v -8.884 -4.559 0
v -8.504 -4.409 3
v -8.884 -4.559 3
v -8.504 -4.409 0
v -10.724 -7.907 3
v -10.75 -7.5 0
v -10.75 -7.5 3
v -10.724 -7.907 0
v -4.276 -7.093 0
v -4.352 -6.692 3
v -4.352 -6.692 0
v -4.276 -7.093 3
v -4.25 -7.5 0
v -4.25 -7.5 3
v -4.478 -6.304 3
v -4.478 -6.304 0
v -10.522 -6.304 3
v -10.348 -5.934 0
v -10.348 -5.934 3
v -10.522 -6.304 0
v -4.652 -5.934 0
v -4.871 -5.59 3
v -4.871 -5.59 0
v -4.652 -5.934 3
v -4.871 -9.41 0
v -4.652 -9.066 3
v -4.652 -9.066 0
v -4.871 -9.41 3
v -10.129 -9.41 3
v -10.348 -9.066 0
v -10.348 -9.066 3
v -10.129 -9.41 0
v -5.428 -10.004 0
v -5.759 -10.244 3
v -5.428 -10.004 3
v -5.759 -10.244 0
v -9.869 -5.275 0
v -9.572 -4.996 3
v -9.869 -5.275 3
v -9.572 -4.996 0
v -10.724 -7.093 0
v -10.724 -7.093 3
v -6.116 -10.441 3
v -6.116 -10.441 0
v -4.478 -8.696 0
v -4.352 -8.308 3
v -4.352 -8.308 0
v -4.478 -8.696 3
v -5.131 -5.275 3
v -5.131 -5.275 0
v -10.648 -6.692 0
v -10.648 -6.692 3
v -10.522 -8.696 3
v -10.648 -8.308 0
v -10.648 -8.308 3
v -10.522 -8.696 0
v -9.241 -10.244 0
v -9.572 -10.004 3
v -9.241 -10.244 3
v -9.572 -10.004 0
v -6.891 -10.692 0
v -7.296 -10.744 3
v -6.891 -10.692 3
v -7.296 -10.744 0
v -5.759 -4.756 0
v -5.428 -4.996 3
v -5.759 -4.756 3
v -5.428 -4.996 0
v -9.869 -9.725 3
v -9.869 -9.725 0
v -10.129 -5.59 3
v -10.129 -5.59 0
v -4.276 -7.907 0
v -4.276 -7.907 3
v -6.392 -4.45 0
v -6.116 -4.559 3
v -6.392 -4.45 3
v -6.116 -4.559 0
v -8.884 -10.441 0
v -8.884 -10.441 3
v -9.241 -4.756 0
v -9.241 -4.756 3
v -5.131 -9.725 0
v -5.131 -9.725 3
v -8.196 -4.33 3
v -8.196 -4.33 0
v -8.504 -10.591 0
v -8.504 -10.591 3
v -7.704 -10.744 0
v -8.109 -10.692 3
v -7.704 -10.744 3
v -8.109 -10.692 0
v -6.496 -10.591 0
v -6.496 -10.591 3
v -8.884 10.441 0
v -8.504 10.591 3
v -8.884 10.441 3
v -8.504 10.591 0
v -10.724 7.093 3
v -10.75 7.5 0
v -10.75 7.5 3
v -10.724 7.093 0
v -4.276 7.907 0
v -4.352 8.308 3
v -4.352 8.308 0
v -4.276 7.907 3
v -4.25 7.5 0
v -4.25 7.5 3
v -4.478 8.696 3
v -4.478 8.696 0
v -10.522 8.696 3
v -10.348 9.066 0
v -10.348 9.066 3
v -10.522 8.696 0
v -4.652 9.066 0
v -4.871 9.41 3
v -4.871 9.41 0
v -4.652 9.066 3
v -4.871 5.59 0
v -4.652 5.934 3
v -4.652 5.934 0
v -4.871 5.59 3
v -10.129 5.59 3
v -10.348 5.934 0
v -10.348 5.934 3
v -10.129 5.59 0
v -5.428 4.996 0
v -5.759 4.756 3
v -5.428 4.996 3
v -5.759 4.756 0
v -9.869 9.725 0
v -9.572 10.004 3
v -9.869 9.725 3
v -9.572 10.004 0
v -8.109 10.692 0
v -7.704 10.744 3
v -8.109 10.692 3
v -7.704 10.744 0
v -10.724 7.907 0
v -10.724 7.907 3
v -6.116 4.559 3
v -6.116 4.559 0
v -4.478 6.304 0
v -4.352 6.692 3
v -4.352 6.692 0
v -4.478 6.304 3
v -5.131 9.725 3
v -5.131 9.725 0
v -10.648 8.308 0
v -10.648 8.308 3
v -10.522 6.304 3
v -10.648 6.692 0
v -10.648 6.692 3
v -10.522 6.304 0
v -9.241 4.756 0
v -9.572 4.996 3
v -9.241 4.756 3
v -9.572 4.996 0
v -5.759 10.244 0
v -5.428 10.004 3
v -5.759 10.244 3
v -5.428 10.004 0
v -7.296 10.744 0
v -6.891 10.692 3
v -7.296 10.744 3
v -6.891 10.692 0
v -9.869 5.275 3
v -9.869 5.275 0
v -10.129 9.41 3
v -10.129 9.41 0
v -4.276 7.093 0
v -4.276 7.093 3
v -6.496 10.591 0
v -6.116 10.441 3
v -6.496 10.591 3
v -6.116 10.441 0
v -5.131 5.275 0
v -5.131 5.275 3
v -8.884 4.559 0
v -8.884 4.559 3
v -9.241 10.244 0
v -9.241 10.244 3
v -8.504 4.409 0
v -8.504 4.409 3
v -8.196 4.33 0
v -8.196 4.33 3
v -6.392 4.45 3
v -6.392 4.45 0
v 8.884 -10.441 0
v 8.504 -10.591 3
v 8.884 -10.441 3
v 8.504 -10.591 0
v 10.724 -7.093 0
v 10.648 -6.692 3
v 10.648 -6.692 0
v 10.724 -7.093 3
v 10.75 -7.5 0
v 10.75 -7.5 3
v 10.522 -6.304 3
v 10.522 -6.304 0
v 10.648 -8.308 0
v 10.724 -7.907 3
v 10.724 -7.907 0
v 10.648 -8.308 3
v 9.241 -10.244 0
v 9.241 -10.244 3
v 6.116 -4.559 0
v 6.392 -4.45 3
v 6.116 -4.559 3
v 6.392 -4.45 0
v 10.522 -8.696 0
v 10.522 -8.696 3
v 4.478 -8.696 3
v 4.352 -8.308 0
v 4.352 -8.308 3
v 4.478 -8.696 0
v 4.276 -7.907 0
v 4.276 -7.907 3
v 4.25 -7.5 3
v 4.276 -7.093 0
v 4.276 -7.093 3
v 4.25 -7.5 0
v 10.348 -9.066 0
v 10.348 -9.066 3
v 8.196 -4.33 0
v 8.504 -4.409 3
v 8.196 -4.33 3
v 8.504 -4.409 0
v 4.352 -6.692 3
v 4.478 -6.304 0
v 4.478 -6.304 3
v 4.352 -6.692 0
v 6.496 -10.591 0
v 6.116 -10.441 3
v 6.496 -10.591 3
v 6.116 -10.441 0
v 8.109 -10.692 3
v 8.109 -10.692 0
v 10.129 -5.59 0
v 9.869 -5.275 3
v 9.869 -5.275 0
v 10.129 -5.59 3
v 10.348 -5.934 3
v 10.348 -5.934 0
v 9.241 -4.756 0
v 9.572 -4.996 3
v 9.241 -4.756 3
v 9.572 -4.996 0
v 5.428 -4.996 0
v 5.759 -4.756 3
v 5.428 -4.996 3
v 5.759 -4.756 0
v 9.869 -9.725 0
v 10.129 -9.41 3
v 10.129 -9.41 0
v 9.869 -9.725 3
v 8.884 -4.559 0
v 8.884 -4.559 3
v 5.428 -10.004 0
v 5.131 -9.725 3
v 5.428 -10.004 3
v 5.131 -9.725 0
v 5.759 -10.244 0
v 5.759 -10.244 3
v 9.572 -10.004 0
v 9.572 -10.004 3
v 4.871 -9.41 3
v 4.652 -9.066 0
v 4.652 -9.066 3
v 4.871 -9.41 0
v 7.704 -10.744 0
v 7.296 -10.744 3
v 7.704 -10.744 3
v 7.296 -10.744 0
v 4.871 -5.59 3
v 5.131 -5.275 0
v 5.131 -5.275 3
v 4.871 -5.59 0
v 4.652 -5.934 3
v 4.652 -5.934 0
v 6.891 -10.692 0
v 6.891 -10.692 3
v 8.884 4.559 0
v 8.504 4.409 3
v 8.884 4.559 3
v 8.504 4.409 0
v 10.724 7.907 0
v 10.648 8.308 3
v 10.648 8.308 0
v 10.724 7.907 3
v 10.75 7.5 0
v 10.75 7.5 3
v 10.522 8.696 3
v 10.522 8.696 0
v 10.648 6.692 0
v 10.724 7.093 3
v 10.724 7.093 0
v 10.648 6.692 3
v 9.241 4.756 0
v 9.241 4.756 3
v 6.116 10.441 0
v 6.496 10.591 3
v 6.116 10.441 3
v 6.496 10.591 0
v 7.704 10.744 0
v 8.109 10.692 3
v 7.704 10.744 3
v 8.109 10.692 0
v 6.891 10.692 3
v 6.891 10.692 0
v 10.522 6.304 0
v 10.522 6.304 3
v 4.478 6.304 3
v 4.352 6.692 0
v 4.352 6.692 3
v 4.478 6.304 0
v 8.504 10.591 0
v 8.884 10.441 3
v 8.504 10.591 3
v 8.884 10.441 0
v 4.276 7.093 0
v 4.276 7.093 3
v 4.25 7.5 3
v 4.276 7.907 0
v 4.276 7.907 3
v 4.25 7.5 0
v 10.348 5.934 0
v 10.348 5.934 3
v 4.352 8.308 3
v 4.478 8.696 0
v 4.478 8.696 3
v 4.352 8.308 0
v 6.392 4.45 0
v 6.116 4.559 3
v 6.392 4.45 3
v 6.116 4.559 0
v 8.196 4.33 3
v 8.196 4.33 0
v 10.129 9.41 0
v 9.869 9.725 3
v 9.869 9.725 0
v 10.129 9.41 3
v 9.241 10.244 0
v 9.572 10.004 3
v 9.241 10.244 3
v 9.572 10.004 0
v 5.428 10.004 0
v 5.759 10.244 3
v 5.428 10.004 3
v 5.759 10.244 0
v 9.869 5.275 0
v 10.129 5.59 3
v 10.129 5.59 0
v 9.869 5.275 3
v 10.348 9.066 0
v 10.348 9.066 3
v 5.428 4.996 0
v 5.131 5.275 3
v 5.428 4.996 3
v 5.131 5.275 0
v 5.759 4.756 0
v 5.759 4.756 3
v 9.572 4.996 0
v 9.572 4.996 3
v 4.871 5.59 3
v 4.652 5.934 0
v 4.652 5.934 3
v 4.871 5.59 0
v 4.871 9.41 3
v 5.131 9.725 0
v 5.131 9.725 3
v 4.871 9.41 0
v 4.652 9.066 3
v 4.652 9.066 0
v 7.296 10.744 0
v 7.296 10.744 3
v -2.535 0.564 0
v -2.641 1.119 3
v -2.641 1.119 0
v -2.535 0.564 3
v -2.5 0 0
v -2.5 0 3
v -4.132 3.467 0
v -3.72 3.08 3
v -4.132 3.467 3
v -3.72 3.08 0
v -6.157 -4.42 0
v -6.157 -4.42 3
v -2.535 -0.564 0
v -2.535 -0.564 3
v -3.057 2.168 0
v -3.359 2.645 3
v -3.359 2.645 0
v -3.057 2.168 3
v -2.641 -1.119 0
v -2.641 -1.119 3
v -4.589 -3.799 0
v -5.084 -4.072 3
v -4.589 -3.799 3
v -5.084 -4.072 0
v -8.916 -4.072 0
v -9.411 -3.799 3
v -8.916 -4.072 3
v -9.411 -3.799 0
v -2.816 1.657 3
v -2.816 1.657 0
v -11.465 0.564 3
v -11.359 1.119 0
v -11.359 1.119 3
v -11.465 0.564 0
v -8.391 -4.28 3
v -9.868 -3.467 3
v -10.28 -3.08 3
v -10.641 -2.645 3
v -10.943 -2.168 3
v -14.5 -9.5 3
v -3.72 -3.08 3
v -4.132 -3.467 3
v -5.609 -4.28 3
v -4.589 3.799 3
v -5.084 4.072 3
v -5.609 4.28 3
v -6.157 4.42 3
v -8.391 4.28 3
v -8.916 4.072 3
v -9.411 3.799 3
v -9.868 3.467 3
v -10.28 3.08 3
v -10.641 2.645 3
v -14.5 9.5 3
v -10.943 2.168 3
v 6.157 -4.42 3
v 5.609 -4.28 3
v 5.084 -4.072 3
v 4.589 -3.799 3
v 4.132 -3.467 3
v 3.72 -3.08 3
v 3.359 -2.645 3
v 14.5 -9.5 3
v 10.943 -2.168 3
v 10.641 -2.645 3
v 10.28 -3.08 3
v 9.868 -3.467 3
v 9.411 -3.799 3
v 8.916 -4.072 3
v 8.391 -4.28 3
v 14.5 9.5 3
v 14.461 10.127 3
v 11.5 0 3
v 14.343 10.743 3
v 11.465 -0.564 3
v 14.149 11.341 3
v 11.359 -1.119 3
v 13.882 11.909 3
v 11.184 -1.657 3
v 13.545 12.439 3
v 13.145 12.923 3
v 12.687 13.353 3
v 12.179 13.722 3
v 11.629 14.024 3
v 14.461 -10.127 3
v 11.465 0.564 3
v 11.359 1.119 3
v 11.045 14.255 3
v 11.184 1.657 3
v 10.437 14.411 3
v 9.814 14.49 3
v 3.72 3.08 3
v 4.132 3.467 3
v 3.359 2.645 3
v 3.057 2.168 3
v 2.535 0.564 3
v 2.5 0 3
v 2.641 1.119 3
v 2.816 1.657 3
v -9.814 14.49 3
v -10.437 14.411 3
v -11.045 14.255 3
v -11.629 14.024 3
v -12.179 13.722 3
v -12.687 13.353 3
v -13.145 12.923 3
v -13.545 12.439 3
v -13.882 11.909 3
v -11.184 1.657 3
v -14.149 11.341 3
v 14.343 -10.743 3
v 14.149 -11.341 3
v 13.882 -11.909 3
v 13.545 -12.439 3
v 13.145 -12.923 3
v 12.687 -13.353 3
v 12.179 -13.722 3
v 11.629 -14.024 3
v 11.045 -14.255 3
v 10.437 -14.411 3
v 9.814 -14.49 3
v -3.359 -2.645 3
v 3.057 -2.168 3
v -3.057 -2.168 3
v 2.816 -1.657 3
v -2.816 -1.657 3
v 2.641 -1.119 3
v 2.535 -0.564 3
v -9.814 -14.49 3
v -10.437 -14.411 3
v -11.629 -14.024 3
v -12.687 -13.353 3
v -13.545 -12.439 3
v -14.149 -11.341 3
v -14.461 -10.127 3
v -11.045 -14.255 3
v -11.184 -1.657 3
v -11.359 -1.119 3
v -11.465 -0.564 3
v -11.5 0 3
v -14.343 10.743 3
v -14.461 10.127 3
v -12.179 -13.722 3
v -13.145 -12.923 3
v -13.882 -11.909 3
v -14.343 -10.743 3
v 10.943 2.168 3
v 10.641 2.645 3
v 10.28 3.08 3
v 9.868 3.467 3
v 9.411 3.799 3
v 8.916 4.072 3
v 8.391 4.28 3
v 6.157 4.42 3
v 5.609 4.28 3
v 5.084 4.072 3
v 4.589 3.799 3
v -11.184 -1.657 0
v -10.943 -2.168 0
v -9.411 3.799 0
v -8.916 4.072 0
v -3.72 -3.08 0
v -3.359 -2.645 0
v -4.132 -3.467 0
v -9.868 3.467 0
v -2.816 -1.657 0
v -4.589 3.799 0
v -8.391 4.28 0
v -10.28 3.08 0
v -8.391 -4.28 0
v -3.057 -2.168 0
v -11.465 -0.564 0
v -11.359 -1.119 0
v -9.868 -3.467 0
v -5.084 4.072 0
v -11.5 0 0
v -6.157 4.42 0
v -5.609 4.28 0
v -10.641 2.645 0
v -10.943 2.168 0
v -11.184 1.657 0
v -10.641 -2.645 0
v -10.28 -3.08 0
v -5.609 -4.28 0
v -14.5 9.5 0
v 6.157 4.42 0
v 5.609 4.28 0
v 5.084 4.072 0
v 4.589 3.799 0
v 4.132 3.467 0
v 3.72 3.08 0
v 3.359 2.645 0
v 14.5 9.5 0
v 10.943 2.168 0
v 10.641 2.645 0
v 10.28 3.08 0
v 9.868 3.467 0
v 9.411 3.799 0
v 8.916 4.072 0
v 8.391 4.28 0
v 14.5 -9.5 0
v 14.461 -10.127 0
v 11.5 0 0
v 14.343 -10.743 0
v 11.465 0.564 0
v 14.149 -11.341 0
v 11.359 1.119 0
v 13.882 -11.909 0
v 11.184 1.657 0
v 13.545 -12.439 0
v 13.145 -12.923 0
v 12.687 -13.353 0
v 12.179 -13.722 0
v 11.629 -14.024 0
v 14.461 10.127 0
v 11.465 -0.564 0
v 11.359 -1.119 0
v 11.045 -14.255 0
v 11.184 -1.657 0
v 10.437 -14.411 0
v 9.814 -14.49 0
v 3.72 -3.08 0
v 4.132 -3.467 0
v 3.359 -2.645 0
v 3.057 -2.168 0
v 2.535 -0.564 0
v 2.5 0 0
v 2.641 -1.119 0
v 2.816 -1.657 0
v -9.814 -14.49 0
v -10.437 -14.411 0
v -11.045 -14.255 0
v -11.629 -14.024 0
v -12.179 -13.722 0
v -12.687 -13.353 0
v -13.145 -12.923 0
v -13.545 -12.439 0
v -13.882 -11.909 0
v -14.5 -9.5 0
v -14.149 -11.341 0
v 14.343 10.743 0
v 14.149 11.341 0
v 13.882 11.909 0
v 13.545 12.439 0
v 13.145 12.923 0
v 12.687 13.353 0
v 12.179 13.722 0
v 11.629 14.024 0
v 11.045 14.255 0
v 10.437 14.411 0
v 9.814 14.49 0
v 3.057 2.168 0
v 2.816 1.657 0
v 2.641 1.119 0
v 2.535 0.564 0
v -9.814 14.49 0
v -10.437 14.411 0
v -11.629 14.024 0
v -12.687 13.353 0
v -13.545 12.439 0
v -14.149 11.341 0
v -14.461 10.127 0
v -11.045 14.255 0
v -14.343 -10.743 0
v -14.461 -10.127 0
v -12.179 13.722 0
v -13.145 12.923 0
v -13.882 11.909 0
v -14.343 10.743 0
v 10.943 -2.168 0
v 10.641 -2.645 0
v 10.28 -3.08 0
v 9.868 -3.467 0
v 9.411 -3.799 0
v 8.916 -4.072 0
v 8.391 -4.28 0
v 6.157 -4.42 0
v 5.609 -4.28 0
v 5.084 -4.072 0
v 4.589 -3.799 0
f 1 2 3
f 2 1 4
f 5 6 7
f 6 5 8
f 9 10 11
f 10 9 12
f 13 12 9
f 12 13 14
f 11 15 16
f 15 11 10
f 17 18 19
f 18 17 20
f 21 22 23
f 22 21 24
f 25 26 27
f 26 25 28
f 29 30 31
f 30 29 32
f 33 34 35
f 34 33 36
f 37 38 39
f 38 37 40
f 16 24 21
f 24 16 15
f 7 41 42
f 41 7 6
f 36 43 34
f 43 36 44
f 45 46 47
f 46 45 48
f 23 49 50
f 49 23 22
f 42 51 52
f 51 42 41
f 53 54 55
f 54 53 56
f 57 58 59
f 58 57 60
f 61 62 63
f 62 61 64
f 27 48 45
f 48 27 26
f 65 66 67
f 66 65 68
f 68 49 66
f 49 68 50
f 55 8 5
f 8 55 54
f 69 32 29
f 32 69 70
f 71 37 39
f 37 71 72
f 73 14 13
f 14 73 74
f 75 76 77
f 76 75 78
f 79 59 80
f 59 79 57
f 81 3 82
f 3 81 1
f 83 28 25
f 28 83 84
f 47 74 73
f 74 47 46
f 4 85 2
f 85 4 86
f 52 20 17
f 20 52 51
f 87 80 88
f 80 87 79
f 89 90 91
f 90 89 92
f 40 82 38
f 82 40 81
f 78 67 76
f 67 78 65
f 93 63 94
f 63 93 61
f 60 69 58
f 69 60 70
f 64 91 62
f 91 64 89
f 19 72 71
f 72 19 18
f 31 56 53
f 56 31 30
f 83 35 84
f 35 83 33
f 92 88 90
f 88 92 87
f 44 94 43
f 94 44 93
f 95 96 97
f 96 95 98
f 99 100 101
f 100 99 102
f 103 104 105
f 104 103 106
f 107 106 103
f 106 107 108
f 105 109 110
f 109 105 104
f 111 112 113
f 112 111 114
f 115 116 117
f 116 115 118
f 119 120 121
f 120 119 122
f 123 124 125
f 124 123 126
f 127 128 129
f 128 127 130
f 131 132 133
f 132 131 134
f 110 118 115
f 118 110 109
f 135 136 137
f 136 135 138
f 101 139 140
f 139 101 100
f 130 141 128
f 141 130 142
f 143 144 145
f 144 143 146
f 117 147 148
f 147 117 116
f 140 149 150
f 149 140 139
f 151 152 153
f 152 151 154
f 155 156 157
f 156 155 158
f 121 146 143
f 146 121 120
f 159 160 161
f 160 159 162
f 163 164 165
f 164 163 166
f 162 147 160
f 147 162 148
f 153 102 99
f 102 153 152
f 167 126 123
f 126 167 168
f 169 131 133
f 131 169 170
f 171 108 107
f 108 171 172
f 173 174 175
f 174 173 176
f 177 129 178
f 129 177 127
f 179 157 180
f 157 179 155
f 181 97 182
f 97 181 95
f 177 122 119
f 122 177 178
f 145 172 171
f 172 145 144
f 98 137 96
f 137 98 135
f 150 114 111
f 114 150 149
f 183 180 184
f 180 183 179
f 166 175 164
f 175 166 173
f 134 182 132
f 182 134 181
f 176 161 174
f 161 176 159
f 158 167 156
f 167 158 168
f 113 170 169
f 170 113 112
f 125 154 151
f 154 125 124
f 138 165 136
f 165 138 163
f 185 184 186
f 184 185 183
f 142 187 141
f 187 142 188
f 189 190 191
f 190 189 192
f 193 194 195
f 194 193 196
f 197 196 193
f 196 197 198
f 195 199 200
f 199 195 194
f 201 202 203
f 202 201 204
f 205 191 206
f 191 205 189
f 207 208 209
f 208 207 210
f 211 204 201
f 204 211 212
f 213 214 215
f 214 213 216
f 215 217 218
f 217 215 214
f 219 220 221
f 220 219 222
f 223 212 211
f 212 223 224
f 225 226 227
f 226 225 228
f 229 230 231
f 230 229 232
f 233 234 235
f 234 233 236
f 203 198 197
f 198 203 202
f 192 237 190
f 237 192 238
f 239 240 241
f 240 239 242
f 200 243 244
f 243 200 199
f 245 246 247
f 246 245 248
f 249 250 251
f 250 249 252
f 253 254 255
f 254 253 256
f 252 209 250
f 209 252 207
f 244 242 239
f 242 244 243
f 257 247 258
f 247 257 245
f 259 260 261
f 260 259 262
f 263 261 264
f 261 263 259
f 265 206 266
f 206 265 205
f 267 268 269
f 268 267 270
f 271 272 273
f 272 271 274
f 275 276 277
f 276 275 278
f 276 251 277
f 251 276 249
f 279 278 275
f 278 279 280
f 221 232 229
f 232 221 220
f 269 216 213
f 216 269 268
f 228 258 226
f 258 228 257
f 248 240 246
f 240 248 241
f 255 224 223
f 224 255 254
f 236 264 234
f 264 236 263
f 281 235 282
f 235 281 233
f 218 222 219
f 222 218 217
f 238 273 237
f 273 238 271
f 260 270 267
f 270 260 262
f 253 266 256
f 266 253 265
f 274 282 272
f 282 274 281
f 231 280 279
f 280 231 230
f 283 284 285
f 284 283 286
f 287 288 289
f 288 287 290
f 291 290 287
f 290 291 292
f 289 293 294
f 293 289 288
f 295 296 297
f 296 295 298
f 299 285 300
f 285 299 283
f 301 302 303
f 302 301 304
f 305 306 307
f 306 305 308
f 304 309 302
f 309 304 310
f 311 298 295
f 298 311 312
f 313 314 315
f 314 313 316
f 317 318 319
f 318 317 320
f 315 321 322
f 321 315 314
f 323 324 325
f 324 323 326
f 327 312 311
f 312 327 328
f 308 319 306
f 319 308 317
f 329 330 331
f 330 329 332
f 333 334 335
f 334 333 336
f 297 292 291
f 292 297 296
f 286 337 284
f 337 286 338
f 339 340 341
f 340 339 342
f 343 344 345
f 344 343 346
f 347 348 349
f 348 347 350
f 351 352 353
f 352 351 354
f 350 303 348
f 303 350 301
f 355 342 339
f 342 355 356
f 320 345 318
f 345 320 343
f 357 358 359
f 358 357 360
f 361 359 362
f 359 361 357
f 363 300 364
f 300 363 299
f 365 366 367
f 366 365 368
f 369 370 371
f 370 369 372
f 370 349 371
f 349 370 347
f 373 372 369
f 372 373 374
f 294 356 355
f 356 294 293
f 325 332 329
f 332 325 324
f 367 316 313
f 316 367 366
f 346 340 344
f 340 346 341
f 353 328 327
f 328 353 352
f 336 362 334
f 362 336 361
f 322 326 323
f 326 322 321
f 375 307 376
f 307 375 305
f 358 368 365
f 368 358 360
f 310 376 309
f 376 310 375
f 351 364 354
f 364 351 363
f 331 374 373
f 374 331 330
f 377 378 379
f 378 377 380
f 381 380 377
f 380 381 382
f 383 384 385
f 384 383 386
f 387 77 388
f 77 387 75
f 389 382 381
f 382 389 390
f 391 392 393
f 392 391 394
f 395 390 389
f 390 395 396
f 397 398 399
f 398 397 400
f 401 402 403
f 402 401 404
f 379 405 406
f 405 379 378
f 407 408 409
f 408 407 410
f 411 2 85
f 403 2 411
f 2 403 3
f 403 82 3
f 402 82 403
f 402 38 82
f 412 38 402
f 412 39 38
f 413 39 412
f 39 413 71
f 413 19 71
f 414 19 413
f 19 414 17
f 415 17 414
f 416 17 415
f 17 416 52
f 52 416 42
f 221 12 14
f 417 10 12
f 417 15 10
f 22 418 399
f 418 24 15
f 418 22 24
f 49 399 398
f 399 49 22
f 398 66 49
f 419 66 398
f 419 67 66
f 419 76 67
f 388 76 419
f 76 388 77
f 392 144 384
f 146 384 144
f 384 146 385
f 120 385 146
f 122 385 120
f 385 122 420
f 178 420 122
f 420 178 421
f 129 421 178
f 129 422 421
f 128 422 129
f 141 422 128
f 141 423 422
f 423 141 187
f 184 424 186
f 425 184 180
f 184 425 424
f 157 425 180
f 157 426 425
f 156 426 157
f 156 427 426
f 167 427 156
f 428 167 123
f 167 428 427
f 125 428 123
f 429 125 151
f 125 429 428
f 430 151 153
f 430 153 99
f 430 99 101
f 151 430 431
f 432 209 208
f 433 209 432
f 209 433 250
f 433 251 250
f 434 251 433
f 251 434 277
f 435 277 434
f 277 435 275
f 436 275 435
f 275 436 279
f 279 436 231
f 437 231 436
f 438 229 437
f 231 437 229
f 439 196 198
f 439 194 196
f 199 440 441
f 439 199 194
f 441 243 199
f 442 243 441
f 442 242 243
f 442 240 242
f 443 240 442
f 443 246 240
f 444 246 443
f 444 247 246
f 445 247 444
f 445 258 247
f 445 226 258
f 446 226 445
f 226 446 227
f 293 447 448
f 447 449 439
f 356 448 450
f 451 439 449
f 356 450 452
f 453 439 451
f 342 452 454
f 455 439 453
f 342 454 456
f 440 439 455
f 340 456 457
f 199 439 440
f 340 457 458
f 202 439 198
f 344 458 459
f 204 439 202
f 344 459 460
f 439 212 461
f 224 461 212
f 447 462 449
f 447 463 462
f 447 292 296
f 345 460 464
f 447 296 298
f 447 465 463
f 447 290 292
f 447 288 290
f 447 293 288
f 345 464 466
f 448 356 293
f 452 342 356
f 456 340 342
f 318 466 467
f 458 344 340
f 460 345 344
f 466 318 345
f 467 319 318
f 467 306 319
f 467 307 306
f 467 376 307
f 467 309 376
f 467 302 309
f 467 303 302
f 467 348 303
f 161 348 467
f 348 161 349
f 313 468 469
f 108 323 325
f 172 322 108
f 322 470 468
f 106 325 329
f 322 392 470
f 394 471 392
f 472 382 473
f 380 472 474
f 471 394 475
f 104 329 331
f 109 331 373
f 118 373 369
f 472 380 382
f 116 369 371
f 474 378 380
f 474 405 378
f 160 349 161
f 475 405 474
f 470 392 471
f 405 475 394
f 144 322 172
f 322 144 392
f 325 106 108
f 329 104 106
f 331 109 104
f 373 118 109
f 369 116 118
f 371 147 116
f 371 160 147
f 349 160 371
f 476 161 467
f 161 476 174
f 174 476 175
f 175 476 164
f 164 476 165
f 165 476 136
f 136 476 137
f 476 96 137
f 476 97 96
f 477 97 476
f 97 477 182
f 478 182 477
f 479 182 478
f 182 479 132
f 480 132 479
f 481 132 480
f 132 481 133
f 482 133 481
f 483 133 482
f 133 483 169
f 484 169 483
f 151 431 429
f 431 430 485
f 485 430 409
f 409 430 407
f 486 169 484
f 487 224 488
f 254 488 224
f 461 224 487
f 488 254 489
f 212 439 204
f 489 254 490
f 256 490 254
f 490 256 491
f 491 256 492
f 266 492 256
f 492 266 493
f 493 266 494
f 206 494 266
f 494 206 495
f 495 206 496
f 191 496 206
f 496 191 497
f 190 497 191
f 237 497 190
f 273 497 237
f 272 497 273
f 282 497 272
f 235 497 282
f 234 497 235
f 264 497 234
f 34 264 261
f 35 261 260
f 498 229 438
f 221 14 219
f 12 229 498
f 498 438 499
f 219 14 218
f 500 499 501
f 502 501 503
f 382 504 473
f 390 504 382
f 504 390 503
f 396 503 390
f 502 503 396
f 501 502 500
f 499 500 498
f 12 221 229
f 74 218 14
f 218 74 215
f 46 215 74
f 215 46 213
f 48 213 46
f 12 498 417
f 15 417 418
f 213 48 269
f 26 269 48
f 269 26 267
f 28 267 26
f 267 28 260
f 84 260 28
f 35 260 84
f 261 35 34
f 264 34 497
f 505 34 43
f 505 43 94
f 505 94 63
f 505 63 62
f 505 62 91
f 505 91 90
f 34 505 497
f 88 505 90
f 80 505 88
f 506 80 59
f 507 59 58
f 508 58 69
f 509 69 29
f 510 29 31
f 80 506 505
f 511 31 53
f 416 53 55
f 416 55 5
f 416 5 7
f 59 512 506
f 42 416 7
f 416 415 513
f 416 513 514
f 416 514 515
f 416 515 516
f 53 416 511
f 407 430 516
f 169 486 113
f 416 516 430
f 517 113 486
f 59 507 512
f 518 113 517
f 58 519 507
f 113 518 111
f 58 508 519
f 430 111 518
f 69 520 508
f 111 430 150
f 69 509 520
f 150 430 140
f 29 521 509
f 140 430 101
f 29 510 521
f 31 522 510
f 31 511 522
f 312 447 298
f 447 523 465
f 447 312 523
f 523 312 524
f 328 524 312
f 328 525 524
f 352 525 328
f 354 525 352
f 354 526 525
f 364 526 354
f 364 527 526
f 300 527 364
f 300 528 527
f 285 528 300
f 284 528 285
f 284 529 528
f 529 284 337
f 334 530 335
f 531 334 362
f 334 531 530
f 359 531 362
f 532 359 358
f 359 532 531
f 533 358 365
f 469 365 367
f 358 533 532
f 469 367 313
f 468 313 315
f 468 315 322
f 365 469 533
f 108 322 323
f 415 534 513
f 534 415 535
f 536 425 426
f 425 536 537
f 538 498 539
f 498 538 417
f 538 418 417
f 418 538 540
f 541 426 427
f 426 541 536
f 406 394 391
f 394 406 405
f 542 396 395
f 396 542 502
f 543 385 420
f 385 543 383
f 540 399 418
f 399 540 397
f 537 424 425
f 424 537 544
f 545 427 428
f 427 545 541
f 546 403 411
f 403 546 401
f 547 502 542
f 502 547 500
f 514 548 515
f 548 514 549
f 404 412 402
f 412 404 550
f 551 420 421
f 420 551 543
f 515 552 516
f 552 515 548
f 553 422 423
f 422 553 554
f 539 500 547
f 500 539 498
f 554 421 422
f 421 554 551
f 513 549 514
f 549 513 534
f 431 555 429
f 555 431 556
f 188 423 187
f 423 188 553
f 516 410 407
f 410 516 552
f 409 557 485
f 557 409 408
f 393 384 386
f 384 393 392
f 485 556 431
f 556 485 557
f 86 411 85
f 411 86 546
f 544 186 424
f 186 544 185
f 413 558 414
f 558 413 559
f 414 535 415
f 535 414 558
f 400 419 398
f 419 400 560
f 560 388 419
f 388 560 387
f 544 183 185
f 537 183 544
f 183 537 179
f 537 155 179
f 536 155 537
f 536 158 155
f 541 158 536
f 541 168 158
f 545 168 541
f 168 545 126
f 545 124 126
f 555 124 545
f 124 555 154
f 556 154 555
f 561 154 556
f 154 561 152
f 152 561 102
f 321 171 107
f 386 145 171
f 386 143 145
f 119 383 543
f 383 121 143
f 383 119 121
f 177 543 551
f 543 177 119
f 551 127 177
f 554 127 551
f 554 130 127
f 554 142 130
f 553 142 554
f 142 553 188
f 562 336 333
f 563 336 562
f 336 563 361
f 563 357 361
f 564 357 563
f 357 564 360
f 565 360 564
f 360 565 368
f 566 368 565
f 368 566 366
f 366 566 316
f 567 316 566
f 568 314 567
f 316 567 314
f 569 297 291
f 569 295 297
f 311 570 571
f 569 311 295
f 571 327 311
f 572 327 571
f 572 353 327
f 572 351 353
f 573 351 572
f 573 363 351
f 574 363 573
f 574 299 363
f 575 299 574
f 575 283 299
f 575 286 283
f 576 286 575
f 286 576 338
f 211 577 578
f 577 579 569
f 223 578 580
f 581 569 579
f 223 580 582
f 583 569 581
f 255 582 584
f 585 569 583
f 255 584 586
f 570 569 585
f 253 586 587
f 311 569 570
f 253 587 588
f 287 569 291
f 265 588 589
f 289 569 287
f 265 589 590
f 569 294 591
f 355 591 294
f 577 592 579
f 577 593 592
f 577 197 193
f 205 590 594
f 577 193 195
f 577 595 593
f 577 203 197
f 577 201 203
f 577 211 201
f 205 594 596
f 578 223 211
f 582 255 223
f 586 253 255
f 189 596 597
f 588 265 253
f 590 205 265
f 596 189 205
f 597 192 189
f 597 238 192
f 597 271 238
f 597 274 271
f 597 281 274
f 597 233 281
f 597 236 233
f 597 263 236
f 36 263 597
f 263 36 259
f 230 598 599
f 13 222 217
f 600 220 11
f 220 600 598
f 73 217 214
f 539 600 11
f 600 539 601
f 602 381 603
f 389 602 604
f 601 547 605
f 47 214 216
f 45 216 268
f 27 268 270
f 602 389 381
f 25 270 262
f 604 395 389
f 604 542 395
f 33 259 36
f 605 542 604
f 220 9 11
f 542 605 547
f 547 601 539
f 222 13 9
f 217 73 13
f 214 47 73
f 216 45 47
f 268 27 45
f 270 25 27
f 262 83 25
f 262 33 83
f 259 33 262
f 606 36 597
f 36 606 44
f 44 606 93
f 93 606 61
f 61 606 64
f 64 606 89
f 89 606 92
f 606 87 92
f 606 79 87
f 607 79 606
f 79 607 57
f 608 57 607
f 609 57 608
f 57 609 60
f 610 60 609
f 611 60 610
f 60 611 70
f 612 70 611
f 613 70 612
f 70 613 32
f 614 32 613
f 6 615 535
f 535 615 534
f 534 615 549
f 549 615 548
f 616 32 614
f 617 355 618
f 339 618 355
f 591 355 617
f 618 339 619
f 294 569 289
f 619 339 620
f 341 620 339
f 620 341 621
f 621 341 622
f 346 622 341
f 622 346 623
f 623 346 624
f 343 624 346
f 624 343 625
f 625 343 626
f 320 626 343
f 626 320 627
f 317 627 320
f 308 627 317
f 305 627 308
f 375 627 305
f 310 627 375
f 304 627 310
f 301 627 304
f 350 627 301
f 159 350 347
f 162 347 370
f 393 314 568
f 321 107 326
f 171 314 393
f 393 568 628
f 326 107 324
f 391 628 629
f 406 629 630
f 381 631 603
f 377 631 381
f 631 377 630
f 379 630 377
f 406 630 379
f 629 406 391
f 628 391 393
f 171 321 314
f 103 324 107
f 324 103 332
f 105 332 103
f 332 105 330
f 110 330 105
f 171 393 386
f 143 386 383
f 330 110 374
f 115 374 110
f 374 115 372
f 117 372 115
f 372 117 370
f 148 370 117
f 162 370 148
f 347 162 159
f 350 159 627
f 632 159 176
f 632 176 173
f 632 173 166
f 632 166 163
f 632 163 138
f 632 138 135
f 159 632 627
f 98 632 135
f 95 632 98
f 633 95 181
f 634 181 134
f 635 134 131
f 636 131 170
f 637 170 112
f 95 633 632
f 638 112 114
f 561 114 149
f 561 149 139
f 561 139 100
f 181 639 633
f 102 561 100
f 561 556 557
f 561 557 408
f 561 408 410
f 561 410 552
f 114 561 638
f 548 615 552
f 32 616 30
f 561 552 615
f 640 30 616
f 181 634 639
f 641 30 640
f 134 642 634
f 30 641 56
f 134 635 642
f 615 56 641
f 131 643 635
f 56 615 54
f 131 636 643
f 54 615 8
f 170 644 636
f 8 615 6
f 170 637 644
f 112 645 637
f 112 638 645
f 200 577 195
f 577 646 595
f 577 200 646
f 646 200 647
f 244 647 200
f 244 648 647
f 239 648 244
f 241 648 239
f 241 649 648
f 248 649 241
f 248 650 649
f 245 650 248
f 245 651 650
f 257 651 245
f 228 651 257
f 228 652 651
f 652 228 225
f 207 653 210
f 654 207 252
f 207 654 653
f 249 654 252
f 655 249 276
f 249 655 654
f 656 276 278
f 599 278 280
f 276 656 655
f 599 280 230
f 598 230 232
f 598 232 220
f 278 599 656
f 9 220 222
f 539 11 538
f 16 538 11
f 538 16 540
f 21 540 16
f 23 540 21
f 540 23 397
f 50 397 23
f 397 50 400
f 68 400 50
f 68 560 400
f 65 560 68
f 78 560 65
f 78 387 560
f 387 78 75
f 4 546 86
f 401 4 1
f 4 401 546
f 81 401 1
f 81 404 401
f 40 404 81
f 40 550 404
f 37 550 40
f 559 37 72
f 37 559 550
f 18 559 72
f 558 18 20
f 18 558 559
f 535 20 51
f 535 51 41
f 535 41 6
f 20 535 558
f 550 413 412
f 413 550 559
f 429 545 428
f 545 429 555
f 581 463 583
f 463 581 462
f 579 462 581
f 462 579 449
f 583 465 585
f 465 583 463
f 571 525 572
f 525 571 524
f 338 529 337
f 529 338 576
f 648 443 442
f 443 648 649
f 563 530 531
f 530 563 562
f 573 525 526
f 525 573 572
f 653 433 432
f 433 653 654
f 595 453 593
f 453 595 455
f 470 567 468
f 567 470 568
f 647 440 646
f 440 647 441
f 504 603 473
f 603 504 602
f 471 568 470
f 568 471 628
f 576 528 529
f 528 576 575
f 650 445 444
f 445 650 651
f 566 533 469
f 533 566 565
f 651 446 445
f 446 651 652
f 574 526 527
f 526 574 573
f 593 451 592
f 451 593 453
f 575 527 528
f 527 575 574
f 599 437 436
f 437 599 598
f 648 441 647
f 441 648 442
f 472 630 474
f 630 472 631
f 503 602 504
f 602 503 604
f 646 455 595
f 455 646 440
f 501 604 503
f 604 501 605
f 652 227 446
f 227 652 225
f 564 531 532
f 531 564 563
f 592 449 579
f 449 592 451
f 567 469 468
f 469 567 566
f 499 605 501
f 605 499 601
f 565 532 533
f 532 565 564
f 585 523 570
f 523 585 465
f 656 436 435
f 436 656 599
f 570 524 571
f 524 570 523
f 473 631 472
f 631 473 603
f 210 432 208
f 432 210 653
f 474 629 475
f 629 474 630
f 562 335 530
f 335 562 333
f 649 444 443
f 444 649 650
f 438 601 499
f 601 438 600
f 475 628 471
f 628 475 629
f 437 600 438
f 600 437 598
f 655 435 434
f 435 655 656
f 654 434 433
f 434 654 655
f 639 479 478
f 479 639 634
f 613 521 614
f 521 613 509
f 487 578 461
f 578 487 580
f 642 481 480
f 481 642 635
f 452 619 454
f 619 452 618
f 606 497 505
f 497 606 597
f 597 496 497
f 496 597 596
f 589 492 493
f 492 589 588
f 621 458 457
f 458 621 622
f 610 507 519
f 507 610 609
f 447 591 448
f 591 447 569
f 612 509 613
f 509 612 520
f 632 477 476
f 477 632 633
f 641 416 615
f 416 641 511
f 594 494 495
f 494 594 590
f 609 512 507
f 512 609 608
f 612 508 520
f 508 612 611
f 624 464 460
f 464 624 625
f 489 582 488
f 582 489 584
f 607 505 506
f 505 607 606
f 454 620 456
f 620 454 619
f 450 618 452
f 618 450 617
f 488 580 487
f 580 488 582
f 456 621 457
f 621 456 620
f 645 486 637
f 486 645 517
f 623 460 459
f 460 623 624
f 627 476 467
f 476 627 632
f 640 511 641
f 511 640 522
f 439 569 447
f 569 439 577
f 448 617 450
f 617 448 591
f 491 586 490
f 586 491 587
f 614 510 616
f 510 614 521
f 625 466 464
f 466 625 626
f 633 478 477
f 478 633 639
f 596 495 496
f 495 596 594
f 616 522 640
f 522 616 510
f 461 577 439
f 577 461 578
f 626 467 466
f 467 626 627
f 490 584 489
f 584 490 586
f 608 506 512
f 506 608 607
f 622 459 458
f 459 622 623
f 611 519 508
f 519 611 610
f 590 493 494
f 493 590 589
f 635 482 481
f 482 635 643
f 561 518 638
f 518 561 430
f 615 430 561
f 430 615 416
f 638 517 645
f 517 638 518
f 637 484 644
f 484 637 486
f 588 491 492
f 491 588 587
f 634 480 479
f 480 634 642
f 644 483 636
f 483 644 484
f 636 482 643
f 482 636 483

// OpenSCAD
$fn = 50;


difference() {
	union() {
		hull() {
			translate(v = [-9.5000000000, 9.5000000000, 0]) {
				cylinder(h = 3, r = 5);
			}
			translate(v = [9.5000000000, 9.5000000000, 0]) {
				cylinder(h = 3, r = 5);
			}
			translate(v = [-9.5000000000, -9.5000000000, 0]) {
				cylinder(h = 3, r = 5);
			}
			translate(v = [9.5000000000, -9.5000000000, 0]) {
				cylinder(h = 3, r = 5);
			}
		}
	}
	union() {
		#translate(v = [-7.5000000000, -7.5000000000, -100.0000000000]) {
			cylinder(h = 200, r = 3.2500000000);
		}
		#translate(v = [-7.5000000000, 7.5000000000, -100.0000000000]) {
			cylinder(h = 200, r = 3.2500000000);
		}
		#translate(v = [7.5000000000, -7.5000000000, -100.0000000000]) {
			cylinder(h = 200, r = 3.2500000000);
		}
		#translate(v = [7.5000000000, 7.5000000000, -100.0000000000]) {
			cylinder(h = 200, r = 3.2500000000);
		}
		#translate(v = [-7.0000000000, 0, 0]) {
			cylinder(h = 3, r = 4.5000000000);
		}
		#translate(v = [7.0000000000, 0, 0]) {
			cylinder(h = 3, r = 4.5000000000);
		}
	}
}
